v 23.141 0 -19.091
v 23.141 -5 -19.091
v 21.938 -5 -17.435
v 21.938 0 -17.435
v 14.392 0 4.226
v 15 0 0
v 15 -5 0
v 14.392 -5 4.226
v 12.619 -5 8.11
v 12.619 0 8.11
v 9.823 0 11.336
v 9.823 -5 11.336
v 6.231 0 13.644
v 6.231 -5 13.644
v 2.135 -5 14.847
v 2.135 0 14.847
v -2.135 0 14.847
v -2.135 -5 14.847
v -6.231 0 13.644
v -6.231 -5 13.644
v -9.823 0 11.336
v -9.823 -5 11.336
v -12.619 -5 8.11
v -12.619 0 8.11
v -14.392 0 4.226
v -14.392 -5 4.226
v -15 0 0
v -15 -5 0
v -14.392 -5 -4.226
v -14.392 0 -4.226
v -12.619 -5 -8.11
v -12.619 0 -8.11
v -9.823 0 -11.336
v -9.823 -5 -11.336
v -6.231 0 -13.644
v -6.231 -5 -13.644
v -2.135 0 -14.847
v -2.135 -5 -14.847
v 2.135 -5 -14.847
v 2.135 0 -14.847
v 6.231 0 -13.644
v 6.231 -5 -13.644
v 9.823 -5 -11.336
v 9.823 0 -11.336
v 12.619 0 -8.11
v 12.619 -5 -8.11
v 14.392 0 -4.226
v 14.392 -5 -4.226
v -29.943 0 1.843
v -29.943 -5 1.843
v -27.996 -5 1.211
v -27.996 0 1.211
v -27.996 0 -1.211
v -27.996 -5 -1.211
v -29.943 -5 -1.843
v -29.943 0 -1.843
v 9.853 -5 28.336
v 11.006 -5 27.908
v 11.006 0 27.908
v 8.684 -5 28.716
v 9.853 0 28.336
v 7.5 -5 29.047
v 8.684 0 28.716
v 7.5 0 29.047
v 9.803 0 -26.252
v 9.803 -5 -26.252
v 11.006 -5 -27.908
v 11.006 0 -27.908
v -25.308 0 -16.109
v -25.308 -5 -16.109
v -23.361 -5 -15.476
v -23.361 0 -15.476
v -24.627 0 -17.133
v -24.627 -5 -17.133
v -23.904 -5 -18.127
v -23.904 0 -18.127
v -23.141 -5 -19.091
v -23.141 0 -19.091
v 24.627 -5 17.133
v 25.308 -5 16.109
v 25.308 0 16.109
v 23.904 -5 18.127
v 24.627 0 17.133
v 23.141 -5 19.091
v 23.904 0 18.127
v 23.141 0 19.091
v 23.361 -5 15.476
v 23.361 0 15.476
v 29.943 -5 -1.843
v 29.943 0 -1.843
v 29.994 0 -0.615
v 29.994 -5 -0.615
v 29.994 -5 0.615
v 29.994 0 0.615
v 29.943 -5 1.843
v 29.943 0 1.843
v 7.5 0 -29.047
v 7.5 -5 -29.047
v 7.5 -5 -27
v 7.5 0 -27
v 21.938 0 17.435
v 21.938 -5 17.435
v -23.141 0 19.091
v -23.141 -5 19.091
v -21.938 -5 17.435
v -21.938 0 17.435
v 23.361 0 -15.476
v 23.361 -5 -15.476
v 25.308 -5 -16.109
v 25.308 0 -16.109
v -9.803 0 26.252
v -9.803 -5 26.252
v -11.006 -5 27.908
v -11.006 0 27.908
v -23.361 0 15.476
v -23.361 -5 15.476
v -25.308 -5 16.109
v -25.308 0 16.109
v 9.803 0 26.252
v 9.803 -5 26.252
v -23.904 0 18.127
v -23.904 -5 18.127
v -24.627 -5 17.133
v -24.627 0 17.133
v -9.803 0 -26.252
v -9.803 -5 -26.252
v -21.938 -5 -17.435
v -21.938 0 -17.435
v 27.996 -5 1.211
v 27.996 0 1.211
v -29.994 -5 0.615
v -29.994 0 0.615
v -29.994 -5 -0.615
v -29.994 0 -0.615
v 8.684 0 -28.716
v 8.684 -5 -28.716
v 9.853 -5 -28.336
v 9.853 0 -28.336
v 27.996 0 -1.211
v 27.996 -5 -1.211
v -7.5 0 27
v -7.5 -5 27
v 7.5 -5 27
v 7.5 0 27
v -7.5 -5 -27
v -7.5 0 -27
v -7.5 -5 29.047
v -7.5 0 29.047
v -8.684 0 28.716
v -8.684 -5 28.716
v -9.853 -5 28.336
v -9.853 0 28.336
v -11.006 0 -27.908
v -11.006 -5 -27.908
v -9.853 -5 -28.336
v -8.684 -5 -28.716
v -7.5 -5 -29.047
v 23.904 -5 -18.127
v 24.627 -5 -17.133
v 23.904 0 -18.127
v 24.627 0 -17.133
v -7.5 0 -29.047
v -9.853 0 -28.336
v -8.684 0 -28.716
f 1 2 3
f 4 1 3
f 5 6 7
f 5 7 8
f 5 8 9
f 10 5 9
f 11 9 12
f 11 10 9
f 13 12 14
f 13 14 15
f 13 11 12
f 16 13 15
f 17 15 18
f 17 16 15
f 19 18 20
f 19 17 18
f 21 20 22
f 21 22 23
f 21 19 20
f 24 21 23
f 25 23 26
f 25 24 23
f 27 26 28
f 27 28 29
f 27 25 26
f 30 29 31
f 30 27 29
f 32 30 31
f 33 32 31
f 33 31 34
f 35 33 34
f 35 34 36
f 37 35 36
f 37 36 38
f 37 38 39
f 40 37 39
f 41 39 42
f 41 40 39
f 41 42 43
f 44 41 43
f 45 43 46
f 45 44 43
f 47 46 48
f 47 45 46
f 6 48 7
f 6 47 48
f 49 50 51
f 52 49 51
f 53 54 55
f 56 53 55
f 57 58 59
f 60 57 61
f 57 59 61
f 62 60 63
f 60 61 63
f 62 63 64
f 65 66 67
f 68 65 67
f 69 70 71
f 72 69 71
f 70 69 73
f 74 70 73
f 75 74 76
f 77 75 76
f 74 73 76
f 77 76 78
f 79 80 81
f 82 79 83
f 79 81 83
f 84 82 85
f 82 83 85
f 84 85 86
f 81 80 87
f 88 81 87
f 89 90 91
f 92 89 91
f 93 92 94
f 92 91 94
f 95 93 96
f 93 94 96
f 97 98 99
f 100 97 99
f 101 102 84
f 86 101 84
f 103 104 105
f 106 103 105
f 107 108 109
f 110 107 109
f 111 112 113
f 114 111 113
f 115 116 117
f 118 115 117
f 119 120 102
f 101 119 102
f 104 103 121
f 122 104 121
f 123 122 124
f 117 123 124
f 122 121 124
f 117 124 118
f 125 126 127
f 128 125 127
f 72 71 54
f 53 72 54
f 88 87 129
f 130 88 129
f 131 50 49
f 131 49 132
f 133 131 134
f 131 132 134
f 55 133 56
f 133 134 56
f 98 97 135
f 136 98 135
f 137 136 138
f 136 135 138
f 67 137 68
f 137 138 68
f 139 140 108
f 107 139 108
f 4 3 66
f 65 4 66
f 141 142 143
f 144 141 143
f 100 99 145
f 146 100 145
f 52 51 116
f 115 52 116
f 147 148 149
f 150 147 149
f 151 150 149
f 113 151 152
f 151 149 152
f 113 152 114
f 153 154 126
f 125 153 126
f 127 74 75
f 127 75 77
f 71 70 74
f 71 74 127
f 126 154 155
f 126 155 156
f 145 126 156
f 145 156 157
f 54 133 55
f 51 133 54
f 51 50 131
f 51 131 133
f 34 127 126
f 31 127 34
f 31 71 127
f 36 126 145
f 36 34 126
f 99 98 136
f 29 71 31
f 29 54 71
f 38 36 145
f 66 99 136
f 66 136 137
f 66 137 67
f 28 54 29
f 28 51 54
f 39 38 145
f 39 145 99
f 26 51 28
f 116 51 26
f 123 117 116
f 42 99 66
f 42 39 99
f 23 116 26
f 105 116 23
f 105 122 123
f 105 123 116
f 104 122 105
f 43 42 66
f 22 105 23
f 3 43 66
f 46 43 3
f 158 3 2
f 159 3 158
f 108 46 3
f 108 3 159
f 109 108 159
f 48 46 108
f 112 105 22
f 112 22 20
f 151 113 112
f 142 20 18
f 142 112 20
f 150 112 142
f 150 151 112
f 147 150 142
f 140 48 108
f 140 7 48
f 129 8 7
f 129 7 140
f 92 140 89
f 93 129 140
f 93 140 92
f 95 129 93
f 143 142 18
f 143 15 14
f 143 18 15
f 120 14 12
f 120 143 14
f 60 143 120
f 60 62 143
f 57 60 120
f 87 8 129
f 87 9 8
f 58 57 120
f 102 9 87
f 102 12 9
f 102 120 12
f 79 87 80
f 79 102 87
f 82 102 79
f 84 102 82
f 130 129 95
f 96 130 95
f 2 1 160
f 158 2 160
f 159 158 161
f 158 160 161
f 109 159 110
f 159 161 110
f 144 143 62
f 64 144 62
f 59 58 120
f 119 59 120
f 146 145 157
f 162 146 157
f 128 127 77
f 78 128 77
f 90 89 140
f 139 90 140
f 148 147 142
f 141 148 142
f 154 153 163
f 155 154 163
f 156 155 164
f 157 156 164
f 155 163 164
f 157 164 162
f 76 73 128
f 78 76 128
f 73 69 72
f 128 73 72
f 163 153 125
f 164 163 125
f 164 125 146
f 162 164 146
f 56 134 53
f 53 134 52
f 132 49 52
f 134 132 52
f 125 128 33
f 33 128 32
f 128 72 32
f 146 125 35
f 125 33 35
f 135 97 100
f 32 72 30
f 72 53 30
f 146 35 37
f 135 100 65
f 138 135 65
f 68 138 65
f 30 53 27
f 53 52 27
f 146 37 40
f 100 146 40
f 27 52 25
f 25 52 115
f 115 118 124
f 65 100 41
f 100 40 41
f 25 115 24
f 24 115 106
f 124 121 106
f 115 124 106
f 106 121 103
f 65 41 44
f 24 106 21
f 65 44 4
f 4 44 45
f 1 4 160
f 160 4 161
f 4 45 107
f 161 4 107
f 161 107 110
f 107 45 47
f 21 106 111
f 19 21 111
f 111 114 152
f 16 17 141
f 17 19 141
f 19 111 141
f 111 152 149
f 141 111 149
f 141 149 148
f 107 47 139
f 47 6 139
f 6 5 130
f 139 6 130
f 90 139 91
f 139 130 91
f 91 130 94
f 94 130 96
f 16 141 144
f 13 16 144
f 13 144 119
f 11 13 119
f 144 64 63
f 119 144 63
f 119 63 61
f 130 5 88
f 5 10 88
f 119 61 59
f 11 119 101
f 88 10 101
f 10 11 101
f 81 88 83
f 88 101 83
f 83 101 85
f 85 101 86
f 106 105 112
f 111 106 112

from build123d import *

# Parameters (mm, degrees)
F0_R     = 30
F0_R_2   = 15
F1_DEPTH = 5
F2_DEPTH = 25


with BuildPart() as f1:
    # F0 (on Front) → F1 (new body)
    with BuildSketch(Plane.XZ):
        Circle(F0_R)
        Circle(F0_R_2, mode=Mode.SUBTRACT)
    extrude(amount=F1_DEPTH)

    # F3 (on face) → F2 (cut)
    with BuildSketch(Plane.XZ.offset(5)):
        with BuildLine():
            ThreePointArc((7.5, 29.0473750966), (3.7801287745, 29.760890888), (0, 30))
            Line((0, 30), (0, 27))
            Line((0, 27), (7.5, 27))
            Line((7.5, 27), (7.5, 29.0473750966))
        make_face()
        with BuildLine():
            Line((0, 27), (0, 30))
            ThreePointArc((0, 30), (-3.7801287745, 29.760890888), (-7.5, 29.0473750966))
            Line((-7.5, 29.0473750966), (-7.5, 27))
            Line((-7.5, 27), (0, 27))
        make_face()
        with BuildLine():
            Line((-17.6335575688, 24.2705098312), (-15.8702018119, 21.8434588481))
            Line((-15.8702018119, 21.8434588481), (-9.8025743541, 26.2518482403))
            Line((-9.8025743541, 26.2518482403), (-11.0059912418, 27.9082094873))
            ThreePointArc((-11.0059912418, 27.9082094873), (-14.4348243396, 26.2989704415), (-17.6335575688, 24.2705098312))
        make_face()
        with BuildLine():
            Line((-21.9378292697, 17.4350694559), (-15.8702018119, 21.8434588481))
            Line((-15.8702018119, 21.8434588481), (-17.6335575688, 24.2705098312))
            ThreePointArc((-17.6335575688, 24.2705098312), (-20.5512011785, 21.8551625507), (-23.1412461574, 19.0914307029))
            Line((-23.1412461574, 19.0914307029), (-21.9378292697, 17.4350694559))
        make_face()
        with BuildLine():
            Line((-28.5316954889, 9.2705098312), (-25.67852594, 8.3434588481))
            Line((-25.67852594, 8.3434588481), (-23.3608984822, 15.4763827203))
            Line((-23.3608984822, 15.4763827203), (-25.308067909, 16.109056419))
            ThreePointArc((-25.308067909, 16.109056419), (-27.1361651776, 12.7917371555), (-28.5316954889, 9.2705098312))
        make_face()
        with BuildLine():
            Line((-27.9961533978, 1.2105349759), (-25.67852594, 8.3434588481))
            Line((-25.67852594, 8.3434588481), (-28.5316954889, 9.2705098312))
            ThreePointArc((-28.5316954889, 9.2705098312), (-29.472413242, 5.6015049487), (-29.9433228247, 1.8432086746))
            Line((-29.9433228247, 1.8432086746), (-27.9961533978, 1.2105349759))
        make_face()
        with BuildLine():
            Line((-28.5316954889, -9.2705098312), (-25.67852594, -8.3434588481))
            Line((-25.67852594, -8.3434588481), (-27.9961533978, -1.2105349759))
            Line((-27.9961533978, -1.2105349759), (-29.9433228247, -1.8432086746))
            ThreePointArc((-29.9433228247, -1.8432086746), (-29.472413242, -5.6015049487), (-28.5316954889, -9.2705098312))
        make_face()
        with BuildLine():
            Line((-23.3608984822, -15.4763827203), (-25.67852594, -8.3434588481))
            Line((-25.67852594, -8.3434588481), (-28.5316954889, -9.2705098312))
            ThreePointArc((-28.5316954889, -9.2705098312), (-27.1361651776, -12.7917371555), (-25.308067909, -16.109056419))
            Line((-25.308067909, -16.109056419), (-23.3608984822, -15.4763827203))
        make_face()
        with BuildLine():
            Line((-17.6335575688, -24.2705098312), (-15.8702018119, -21.8434588481))
            Line((-15.8702018119, -21.8434588481), (-21.9378292697, -17.4350694559))
            Line((-21.9378292697, -17.4350694559), (-23.1412461574, -19.0914307029))
            ThreePointArc((-23.1412461574, -19.0914307029), (-20.5512011785, -21.8551625507), (-17.6335575688, -24.2705098312))
        make_face()
        with BuildLine():
            Line((-9.8025743541, -26.2518482403), (-15.8702018119, -21.8434588481))
            Line((-15.8702018119, -21.8434588481), (-17.6335575688, -24.2705098312))
            ThreePointArc((-17.6335575688, -24.2705098312), (-14.4348243396, -26.2989704415), (-11.0059912418, -27.9082094873))
            Line((-11.0059912418, -27.9082094873), (-9.8025743541, -26.2518482403))
        make_face()
        with BuildLine():
            Line((0, -30), (0, -27))
            Line((0, -27), (-7.5, -27))
            Line((-7.5, -27), (-7.5, -29.0473750966))
            ThreePointArc((-7.5, -29.0473750966), (-3.7801287745, -29.760890888), (0, -30))
        make_face()
        with BuildLine():
            Line((7.5, -27), (0, -27))
            Line((0, -27), (0, -30))
            ThreePointArc((0, -30), (3.7801287745, -29.760890888), (7.5, -29.0473750966))
            Line((7.5, -29.0473750966), (7.5, -27))
        make_face()
        with BuildLine():
            Line((17.6335575688, -24.2705098312), (15.8702018119, -21.8434588481))
            Line((15.8702018119, -21.8434588481), (9.8025743541, -26.2518482403))
            Line((9.8025743541, -26.2518482403), (11.0059912418, -27.9082094873))
            ThreePointArc((11.0059912418, -27.9082094873), (14.4348243396, -26.2989704415), (17.6335575688, -24.2705098312))
        make_face()
        with BuildLine():
            Line((21.9378292697, -17.4350694559), (15.8702018119, -21.8434588481))
            Line((15.8702018119, -21.8434588481), (17.6335575688, -24.2705098312))
            ThreePointArc((17.6335575688, -24.2705098312), (20.5512011785, -21.8551625507), (23.1412461574, -19.0914307029))
            Line((23.1412461574, -19.0914307029), (21.9378292697, -17.4350694559))
        make_face()
        with BuildLine():
            Line((28.5316954889, -9.2705098312), (25.67852594, -8.3434588481))
            Line((25.67852594, -8.3434588481), (23.3608984822, -15.4763827203))
            Line((23.3608984822, -15.4763827203), (25.308067909, -16.109056419))
            ThreePointArc((25.308067909, -16.109056419), (27.1361651776, -12.7917371555), (28.5316954889, -9.2705098312))
        make_face()
        with BuildLine():
            Line((27.9961533978, -1.2105349759), (25.67852594, -8.3434588481))
            Line((25.67852594, -8.3434588481), (28.5316954889, -9.2705098312))
            ThreePointArc((28.5316954889, -9.2705098312), (29.472413242, -5.6015049487), (29.9433228247, -1.8432086746))
            Line((29.9433228247, -1.8432086746), (27.9961533978, -1.2105349759))
        make_face()
        with BuildLine():
            Line((28.5316954889, 9.2705098312), (25.67852594, 8.3434588481))
            Line((25.67852594, 8.3434588481), (27.9961533978, 1.2105349759))
            Line((27.9961533978, 1.2105349759), (29.9433228247, 1.8432086746))
            ThreePointArc((29.9433228247, 1.8432086746), (29.472413242, 5.6015049487), (28.5316954889, 9.2705098312))
        make_face()
        with BuildLine():
            Line((23.3608984822, 15.4763827203), (25.67852594, 8.3434588481))
            Line((25.67852594, 8.3434588481), (28.5316954889, 9.2705098312))
            ThreePointArc((28.5316954889, 9.2705098312), (27.1361651776, 12.7917371555), (25.308067909, 16.109056419))
            Line((25.308067909, 16.109056419), (23.3608984822, 15.4763827203))
        make_face()
        with BuildLine():
            Line((17.6335575688, 24.2705098312), (15.8702018119, 21.8434588481))
            Line((15.8702018119, 21.8434588481), (21.9378292697, 17.4350694559))
            Line((21.9378292697, 17.4350694559), (23.1412461574, 19.0914307029))
            ThreePointArc((23.1412461574, 19.0914307029), (20.5512011785, 21.8551625507), (17.6335575688, 24.2705098312))
        make_face()
        with BuildLine():
            Line((9.8025743541, 26.2518482403), (15.8702018119, 21.8434588481))
            Line((15.8702018119, 21.8434588481), (17.6335575688, 24.2705098312))
            ThreePointArc((17.6335575688, 24.2705098312), (14.4348243396, 26.2989704415), (11.0059912418, 27.9082094873))
            Line((11.0059912418, 27.9082094873), (9.8025743541, 26.2518482403))
        make_face()
    extrude(amount=-F2_DEPTH, mode=Mode.SUBTRACT)


solid = f1.part
